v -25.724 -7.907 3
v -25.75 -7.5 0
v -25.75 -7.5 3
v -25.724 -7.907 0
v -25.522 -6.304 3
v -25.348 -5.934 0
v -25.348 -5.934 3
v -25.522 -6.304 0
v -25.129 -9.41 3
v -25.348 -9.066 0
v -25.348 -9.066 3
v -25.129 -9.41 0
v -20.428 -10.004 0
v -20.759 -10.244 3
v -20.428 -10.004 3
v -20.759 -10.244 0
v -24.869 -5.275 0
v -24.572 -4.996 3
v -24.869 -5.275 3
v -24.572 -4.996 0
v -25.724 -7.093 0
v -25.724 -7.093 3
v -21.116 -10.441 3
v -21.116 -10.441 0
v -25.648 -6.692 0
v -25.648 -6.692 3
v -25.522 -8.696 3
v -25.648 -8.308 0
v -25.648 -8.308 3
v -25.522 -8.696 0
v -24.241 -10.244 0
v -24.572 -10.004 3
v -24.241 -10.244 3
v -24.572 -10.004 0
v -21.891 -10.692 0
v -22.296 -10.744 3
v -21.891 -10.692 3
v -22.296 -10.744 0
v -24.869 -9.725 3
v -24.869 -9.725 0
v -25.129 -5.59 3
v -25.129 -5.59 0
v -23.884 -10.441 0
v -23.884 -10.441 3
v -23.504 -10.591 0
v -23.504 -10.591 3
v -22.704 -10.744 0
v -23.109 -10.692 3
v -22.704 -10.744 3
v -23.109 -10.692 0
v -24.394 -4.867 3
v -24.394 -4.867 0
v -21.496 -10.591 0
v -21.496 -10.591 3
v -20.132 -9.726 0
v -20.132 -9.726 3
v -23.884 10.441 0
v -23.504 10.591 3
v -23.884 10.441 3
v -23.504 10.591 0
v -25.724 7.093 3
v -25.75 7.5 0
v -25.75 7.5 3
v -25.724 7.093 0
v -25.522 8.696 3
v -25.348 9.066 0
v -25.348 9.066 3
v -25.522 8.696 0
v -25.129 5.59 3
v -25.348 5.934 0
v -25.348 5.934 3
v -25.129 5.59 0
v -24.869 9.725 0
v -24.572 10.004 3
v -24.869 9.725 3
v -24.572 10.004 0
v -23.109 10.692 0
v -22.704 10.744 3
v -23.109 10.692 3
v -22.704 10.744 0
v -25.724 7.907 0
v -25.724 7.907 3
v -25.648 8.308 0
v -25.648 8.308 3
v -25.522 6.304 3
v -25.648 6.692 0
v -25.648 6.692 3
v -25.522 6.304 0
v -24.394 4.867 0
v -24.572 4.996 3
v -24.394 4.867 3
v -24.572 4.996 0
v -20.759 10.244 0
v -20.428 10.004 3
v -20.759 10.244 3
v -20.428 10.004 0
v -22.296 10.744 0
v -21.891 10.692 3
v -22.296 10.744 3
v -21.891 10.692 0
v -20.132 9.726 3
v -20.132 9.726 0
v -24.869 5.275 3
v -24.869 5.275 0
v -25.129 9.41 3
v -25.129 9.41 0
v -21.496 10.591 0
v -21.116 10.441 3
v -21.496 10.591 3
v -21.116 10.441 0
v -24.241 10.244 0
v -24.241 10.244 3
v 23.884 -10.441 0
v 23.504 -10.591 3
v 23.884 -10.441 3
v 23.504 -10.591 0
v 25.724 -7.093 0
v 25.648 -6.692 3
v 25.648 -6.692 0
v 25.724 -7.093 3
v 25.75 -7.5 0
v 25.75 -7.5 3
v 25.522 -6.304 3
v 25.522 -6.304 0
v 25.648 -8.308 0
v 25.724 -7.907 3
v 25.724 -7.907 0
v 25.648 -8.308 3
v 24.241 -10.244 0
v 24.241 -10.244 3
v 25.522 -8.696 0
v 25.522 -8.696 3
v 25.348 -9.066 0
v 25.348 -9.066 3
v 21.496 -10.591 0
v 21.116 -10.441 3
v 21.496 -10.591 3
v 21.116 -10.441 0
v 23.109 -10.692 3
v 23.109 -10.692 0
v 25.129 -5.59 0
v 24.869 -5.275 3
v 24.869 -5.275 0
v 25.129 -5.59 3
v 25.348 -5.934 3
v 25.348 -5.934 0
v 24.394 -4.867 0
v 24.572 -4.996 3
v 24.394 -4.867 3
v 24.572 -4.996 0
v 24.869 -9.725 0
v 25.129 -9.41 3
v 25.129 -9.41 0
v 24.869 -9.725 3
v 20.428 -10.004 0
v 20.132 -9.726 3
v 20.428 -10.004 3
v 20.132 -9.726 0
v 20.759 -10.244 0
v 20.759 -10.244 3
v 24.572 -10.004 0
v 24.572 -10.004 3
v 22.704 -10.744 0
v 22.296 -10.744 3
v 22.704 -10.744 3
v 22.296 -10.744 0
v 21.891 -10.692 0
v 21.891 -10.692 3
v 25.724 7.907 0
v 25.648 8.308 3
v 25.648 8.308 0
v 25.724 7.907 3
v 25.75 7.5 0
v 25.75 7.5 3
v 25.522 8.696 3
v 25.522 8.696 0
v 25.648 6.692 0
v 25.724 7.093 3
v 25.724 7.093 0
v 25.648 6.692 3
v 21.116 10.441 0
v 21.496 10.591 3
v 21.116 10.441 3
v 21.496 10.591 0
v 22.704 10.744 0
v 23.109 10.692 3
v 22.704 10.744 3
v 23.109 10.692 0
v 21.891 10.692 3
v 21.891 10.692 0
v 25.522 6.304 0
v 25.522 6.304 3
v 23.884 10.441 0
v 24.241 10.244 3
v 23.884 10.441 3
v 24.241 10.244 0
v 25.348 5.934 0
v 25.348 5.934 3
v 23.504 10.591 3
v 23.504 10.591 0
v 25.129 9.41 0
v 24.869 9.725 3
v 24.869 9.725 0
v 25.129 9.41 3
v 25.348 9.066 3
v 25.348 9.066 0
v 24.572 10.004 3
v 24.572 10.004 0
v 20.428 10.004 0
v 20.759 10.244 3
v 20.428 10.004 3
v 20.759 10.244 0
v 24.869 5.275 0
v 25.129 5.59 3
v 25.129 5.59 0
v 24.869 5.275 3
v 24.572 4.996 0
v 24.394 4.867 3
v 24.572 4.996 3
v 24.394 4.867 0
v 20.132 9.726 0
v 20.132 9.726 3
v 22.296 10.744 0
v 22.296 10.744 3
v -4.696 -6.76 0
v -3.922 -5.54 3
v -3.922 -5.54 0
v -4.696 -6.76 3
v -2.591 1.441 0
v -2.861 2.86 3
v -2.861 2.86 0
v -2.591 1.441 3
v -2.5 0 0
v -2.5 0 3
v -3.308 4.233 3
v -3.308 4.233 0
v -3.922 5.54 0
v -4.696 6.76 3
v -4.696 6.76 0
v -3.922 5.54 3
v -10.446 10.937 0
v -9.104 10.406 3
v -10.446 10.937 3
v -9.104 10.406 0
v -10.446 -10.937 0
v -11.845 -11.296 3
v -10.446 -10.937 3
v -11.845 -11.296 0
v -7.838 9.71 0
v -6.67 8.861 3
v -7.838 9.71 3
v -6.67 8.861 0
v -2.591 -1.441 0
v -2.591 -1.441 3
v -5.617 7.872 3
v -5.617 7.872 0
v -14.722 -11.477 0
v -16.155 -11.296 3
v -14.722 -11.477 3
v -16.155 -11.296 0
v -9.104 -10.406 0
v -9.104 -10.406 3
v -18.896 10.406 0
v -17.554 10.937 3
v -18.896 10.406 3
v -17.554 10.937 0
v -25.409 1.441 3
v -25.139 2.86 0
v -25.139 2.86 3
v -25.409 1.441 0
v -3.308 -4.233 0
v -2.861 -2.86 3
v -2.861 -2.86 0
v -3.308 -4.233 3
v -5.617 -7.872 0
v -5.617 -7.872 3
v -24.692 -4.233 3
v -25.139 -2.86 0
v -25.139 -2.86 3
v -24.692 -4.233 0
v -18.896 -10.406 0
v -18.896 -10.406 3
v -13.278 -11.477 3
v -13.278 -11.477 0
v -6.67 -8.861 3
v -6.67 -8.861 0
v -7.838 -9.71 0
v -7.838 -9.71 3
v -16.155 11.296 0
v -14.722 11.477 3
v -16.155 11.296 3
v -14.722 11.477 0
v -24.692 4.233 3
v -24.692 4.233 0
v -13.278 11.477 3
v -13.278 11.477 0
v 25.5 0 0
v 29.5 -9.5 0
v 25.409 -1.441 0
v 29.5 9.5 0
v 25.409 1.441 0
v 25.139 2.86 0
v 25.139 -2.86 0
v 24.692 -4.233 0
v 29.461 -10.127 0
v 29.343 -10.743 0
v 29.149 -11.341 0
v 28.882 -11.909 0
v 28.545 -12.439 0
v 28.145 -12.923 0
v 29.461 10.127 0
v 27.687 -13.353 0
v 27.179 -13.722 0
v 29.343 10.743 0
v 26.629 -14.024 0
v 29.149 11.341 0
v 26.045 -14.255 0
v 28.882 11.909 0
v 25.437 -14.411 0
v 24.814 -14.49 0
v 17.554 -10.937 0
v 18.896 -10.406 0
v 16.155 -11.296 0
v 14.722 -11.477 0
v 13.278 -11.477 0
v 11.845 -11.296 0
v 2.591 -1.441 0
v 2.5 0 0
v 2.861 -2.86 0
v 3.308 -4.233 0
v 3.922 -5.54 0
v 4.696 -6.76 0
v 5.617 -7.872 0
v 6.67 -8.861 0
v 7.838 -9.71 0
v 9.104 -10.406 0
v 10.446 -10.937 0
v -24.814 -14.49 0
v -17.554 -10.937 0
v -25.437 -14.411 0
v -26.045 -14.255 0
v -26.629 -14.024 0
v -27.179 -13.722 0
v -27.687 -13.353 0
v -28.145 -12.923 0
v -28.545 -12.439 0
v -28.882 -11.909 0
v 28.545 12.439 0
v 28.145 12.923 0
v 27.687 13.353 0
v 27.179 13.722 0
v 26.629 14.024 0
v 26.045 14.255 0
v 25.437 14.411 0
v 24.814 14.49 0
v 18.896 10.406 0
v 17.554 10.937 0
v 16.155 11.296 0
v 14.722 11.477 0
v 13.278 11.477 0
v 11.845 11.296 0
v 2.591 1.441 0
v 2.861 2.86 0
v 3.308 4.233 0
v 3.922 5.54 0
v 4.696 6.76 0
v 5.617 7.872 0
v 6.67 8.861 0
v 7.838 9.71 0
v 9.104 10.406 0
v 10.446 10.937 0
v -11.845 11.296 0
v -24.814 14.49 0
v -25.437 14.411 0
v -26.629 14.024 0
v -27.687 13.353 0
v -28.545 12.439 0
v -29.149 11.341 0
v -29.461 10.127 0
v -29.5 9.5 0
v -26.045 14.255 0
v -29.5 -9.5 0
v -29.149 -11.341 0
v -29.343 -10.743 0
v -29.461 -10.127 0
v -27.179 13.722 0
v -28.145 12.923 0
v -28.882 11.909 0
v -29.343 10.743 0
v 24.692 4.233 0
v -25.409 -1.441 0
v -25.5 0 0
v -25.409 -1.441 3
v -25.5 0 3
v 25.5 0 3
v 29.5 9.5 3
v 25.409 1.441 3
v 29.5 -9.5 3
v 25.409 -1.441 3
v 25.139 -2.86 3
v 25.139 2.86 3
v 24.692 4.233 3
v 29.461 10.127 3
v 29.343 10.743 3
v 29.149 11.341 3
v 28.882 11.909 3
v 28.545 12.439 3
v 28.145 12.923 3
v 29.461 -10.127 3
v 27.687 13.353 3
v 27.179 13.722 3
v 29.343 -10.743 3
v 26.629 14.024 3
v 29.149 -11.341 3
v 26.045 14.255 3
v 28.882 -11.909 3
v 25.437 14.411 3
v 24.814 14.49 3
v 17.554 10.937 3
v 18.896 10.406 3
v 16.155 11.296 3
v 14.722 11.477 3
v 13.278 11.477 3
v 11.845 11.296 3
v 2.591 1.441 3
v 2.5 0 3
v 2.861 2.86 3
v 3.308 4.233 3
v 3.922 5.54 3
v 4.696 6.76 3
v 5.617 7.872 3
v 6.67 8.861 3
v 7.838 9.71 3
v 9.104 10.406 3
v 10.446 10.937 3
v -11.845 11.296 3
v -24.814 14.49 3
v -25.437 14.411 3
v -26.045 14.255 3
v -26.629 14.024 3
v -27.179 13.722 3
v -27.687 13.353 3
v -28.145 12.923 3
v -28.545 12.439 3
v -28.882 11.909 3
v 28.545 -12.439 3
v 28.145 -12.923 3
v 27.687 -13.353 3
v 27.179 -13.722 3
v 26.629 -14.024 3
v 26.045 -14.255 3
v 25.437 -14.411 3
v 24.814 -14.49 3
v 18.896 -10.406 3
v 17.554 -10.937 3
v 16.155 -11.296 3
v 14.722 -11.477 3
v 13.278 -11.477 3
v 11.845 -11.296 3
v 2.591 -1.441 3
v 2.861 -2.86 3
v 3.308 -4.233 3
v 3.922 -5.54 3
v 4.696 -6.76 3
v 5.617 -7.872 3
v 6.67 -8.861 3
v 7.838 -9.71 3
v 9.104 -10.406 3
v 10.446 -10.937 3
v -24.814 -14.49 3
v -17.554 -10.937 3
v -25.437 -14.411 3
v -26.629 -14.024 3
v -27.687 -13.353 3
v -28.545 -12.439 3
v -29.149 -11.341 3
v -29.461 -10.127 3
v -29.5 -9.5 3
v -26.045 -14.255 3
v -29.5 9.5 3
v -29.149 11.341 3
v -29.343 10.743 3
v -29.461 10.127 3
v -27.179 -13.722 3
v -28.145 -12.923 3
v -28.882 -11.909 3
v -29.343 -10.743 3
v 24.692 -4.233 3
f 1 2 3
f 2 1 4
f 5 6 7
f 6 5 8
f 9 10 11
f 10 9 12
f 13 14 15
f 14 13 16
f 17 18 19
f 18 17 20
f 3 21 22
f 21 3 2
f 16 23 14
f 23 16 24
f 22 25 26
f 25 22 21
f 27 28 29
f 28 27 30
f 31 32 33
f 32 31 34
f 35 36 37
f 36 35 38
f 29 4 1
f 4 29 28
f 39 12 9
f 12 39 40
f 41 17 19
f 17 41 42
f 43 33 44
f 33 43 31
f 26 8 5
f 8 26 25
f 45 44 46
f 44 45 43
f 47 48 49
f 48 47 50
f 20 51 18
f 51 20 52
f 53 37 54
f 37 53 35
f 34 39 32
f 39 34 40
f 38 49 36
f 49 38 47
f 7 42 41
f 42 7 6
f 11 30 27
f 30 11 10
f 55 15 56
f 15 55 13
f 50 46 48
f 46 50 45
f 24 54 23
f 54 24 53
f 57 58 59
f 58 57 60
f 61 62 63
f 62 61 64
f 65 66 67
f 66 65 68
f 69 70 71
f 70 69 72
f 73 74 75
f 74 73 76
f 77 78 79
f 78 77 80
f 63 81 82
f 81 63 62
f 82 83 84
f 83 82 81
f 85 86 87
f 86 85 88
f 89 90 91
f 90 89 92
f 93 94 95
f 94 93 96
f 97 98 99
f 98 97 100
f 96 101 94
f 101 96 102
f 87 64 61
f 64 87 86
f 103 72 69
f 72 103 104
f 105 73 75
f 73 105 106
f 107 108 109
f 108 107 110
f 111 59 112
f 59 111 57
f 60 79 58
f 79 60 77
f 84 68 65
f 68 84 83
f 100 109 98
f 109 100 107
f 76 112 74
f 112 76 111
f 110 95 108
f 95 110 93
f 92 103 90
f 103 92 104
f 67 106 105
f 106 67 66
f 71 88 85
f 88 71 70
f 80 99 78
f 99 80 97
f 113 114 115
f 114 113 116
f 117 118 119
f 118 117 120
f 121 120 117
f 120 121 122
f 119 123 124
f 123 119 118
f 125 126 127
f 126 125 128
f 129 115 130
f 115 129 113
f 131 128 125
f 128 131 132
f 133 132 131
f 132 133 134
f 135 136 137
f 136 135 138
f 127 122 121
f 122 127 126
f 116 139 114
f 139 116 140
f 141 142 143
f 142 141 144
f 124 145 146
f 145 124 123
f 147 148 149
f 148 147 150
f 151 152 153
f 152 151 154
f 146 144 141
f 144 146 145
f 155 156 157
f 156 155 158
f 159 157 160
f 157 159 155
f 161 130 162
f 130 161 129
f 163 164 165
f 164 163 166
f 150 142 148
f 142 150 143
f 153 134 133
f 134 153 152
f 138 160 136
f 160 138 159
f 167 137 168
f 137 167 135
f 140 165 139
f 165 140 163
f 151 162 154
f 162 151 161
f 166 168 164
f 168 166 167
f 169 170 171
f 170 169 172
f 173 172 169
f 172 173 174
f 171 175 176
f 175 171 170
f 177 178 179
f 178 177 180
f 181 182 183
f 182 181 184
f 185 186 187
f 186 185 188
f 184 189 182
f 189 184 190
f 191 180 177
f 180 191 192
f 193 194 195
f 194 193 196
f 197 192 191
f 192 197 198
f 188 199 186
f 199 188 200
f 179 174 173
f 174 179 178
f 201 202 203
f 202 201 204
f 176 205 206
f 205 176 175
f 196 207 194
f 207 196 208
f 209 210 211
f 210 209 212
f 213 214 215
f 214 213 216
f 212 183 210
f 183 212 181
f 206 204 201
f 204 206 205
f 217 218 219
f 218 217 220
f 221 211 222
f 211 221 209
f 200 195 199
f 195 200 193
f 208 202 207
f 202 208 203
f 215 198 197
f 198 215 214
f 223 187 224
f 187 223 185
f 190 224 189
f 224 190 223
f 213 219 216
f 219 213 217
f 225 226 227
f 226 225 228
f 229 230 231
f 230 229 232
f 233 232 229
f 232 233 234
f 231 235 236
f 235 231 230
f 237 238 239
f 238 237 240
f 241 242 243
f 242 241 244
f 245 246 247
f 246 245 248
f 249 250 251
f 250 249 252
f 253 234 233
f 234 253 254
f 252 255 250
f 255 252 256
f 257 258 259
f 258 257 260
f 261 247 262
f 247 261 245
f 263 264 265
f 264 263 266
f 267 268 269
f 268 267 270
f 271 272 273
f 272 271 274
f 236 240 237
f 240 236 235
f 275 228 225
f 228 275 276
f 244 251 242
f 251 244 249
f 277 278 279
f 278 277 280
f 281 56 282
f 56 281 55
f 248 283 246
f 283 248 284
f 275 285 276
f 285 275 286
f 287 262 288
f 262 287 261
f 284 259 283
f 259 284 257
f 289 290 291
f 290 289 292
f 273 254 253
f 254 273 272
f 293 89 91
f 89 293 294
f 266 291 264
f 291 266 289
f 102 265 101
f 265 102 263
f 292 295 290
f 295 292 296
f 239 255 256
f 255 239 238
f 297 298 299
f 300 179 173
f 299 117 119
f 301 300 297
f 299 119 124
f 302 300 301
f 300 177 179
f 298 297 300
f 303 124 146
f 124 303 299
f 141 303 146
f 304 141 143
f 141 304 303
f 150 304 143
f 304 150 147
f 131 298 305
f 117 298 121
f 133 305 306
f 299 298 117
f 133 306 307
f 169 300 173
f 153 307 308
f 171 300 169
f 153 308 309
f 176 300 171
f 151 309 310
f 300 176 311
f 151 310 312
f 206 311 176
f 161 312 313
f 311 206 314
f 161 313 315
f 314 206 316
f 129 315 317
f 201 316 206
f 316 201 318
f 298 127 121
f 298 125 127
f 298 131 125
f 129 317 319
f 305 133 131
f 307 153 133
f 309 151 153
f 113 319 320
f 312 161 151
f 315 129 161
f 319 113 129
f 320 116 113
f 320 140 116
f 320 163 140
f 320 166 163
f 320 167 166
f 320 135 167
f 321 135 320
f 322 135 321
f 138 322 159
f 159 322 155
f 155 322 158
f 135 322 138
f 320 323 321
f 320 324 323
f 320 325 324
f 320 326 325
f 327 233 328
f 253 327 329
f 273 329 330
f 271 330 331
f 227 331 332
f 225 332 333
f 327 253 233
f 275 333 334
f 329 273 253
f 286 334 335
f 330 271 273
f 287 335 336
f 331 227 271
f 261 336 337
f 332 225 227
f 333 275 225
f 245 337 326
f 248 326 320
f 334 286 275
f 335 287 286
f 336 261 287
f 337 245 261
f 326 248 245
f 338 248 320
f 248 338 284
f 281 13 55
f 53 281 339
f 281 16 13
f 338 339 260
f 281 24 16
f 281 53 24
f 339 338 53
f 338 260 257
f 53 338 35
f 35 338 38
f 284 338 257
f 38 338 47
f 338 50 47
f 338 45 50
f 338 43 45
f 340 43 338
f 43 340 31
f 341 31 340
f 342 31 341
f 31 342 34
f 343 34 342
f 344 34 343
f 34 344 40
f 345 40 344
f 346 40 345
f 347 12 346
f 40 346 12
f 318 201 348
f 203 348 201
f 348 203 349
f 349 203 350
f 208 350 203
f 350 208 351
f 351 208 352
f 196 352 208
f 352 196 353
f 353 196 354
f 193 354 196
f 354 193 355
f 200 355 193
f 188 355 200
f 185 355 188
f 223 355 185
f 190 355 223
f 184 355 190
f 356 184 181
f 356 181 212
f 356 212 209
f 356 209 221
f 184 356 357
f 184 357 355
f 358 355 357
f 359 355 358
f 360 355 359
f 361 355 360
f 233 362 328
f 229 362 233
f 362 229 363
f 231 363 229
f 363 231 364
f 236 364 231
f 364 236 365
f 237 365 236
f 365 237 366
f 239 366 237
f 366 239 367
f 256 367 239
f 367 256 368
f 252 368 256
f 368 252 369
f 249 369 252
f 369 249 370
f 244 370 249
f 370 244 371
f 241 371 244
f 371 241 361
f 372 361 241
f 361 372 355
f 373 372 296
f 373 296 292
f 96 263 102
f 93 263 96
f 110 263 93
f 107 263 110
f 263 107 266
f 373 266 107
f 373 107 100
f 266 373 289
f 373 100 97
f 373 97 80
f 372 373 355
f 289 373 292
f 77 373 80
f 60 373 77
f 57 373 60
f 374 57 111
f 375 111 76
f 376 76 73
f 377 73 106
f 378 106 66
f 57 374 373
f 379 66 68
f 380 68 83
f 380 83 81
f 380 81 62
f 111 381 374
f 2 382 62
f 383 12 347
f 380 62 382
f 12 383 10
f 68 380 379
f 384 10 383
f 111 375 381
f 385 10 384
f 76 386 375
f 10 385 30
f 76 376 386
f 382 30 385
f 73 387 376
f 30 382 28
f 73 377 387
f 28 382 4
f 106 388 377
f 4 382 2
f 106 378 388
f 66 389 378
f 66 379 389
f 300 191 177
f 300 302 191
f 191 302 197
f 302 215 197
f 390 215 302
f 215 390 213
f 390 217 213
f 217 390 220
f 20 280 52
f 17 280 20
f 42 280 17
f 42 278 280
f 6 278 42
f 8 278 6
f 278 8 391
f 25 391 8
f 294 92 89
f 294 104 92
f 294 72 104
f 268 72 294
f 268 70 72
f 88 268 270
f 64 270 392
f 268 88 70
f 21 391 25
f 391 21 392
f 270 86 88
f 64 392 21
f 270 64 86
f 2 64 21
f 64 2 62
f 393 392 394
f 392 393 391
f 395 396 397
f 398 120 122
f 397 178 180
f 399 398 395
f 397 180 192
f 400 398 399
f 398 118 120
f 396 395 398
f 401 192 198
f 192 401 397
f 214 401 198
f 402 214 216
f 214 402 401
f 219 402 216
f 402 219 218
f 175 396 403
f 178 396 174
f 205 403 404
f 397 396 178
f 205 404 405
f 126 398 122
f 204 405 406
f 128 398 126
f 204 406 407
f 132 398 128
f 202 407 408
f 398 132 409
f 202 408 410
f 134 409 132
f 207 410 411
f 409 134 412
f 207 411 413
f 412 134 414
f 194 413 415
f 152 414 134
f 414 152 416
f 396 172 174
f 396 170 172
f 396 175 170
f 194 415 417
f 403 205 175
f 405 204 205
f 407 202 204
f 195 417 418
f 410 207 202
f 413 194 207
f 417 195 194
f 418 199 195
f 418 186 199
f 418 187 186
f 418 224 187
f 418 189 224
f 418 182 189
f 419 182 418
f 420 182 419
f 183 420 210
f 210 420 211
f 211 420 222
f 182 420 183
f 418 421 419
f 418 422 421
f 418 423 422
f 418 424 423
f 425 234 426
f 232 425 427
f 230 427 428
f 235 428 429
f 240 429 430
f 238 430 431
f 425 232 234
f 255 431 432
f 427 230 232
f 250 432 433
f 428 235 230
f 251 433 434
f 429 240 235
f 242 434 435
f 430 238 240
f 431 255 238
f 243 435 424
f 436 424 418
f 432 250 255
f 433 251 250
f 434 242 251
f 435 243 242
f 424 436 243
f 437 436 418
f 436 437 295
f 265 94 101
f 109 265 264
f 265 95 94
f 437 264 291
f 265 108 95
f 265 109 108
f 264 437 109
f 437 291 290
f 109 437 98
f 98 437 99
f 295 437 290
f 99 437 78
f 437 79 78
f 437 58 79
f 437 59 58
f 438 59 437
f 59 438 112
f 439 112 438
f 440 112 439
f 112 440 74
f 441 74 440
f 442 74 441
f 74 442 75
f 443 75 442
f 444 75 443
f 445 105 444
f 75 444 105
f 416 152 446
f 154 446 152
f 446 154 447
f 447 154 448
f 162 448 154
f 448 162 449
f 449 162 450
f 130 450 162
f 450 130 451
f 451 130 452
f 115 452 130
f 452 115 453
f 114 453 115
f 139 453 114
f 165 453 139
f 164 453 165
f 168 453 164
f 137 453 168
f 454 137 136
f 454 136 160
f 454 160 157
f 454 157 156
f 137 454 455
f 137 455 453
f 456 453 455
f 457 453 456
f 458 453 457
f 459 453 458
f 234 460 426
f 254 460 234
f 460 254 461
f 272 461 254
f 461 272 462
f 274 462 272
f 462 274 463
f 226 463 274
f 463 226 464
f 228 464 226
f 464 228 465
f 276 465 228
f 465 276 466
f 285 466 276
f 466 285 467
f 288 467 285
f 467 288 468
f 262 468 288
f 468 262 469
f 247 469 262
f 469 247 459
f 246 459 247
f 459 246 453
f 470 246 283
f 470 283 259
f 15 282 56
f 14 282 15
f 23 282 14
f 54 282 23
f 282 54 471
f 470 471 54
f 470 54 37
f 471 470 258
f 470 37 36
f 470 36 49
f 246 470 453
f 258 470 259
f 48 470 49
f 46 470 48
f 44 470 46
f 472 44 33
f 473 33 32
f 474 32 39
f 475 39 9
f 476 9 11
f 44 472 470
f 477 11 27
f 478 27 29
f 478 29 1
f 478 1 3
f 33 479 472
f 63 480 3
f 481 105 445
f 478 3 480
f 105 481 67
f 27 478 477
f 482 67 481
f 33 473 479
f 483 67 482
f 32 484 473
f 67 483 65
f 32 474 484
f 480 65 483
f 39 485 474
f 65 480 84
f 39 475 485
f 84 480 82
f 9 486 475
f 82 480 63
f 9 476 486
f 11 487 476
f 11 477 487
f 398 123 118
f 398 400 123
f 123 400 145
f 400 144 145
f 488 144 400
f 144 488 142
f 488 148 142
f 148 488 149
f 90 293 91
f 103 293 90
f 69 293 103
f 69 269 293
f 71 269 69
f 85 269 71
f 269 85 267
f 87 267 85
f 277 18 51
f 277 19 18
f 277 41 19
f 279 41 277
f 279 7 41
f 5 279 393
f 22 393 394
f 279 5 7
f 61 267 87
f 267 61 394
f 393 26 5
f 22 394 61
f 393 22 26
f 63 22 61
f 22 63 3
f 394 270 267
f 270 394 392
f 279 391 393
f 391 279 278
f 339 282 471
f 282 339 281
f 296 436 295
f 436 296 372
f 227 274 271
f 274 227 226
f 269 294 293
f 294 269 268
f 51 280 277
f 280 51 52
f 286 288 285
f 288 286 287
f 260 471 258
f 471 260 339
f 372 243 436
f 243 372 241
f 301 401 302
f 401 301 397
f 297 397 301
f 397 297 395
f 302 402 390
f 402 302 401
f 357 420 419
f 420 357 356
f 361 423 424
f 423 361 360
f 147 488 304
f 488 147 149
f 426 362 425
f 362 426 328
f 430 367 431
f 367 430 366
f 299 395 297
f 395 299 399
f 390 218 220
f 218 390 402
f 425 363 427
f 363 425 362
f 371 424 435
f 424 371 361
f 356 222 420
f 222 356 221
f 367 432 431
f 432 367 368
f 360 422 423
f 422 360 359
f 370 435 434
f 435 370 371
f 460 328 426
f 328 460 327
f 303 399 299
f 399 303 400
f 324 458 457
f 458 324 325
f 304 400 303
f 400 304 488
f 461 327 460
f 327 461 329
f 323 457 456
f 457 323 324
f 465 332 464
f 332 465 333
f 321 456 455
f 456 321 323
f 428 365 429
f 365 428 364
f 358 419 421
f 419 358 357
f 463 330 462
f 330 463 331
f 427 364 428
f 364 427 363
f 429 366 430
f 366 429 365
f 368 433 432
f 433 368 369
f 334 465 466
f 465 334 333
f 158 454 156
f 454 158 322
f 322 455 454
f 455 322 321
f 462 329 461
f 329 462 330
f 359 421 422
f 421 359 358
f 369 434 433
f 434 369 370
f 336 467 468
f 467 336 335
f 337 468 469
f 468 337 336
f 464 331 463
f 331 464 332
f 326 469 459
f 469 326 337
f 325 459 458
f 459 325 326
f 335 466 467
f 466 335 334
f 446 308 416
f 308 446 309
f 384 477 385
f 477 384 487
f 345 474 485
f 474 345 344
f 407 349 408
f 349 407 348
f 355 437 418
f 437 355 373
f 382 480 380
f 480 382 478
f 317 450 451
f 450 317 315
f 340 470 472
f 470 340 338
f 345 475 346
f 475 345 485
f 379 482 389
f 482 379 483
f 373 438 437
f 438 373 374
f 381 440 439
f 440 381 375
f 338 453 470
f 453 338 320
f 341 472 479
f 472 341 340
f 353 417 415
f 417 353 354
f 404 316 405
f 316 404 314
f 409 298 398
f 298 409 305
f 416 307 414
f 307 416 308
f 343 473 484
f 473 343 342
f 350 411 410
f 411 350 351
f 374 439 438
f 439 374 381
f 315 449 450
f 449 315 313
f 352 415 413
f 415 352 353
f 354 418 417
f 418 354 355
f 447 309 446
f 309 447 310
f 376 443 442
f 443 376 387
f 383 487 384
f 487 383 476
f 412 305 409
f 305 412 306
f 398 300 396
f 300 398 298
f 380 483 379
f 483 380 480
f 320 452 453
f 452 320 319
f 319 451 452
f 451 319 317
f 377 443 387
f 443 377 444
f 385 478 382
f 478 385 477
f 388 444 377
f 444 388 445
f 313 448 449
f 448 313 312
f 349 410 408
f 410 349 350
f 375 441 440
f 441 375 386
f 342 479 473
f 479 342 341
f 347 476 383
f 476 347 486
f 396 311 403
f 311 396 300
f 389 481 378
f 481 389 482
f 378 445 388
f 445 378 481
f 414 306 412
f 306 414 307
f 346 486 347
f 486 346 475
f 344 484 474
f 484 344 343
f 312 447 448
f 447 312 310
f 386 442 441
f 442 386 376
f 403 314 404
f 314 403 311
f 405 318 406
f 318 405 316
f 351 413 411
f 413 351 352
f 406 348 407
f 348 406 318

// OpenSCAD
$fn = 50;


difference() {
	union() {
		hull() {
			translate(v = [-24.5000000000, 9.5000000000, 0]) {
				cylinder(h = 3, r = 5);
			}
			translate(v = [24.5000000000, 9.5000000000, 0]) {
				cylinder(h = 3, r = 5);
			}
			translate(v = [-24.5000000000, -9.5000000000, 0]) {
				cylinder(h = 3, r = 5);
			}
			translate(v = [24.5000000000, -9.5000000000, 0]) {
				cylinder(h = 3, r = 5);
			}
		}
	}
	union() {
		#translate(v = [-22.5000000000, -7.5000000000, -100.0000000000]) {
			cylinder(h = 200, r = 3.2500000000);
		}
		#translate(v = [-22.5000000000, 7.5000000000, -100.0000000000]) {
			cylinder(h = 200, r = 3.2500000000);
		}
		#translate(v = [22.5000000000, -7.5000000000, -100.0000000000]) {
			cylinder(h = 200, r = 3.2500000000);
		}
		#translate(v = [22.5000000000, 7.5000000000, -100.0000000000]) {
			cylinder(h = 200, r = 3.2500000000);
		}
		#translate(v = [-14.0000000000, 0, 0]) {
			cylinder(h = 3, r = 11.5000000000);
		}
		#translate(v = [14.0000000000, 0, 0]) {
			cylinder(h = 3, r = 11.5000000000);
		}
	}
}
